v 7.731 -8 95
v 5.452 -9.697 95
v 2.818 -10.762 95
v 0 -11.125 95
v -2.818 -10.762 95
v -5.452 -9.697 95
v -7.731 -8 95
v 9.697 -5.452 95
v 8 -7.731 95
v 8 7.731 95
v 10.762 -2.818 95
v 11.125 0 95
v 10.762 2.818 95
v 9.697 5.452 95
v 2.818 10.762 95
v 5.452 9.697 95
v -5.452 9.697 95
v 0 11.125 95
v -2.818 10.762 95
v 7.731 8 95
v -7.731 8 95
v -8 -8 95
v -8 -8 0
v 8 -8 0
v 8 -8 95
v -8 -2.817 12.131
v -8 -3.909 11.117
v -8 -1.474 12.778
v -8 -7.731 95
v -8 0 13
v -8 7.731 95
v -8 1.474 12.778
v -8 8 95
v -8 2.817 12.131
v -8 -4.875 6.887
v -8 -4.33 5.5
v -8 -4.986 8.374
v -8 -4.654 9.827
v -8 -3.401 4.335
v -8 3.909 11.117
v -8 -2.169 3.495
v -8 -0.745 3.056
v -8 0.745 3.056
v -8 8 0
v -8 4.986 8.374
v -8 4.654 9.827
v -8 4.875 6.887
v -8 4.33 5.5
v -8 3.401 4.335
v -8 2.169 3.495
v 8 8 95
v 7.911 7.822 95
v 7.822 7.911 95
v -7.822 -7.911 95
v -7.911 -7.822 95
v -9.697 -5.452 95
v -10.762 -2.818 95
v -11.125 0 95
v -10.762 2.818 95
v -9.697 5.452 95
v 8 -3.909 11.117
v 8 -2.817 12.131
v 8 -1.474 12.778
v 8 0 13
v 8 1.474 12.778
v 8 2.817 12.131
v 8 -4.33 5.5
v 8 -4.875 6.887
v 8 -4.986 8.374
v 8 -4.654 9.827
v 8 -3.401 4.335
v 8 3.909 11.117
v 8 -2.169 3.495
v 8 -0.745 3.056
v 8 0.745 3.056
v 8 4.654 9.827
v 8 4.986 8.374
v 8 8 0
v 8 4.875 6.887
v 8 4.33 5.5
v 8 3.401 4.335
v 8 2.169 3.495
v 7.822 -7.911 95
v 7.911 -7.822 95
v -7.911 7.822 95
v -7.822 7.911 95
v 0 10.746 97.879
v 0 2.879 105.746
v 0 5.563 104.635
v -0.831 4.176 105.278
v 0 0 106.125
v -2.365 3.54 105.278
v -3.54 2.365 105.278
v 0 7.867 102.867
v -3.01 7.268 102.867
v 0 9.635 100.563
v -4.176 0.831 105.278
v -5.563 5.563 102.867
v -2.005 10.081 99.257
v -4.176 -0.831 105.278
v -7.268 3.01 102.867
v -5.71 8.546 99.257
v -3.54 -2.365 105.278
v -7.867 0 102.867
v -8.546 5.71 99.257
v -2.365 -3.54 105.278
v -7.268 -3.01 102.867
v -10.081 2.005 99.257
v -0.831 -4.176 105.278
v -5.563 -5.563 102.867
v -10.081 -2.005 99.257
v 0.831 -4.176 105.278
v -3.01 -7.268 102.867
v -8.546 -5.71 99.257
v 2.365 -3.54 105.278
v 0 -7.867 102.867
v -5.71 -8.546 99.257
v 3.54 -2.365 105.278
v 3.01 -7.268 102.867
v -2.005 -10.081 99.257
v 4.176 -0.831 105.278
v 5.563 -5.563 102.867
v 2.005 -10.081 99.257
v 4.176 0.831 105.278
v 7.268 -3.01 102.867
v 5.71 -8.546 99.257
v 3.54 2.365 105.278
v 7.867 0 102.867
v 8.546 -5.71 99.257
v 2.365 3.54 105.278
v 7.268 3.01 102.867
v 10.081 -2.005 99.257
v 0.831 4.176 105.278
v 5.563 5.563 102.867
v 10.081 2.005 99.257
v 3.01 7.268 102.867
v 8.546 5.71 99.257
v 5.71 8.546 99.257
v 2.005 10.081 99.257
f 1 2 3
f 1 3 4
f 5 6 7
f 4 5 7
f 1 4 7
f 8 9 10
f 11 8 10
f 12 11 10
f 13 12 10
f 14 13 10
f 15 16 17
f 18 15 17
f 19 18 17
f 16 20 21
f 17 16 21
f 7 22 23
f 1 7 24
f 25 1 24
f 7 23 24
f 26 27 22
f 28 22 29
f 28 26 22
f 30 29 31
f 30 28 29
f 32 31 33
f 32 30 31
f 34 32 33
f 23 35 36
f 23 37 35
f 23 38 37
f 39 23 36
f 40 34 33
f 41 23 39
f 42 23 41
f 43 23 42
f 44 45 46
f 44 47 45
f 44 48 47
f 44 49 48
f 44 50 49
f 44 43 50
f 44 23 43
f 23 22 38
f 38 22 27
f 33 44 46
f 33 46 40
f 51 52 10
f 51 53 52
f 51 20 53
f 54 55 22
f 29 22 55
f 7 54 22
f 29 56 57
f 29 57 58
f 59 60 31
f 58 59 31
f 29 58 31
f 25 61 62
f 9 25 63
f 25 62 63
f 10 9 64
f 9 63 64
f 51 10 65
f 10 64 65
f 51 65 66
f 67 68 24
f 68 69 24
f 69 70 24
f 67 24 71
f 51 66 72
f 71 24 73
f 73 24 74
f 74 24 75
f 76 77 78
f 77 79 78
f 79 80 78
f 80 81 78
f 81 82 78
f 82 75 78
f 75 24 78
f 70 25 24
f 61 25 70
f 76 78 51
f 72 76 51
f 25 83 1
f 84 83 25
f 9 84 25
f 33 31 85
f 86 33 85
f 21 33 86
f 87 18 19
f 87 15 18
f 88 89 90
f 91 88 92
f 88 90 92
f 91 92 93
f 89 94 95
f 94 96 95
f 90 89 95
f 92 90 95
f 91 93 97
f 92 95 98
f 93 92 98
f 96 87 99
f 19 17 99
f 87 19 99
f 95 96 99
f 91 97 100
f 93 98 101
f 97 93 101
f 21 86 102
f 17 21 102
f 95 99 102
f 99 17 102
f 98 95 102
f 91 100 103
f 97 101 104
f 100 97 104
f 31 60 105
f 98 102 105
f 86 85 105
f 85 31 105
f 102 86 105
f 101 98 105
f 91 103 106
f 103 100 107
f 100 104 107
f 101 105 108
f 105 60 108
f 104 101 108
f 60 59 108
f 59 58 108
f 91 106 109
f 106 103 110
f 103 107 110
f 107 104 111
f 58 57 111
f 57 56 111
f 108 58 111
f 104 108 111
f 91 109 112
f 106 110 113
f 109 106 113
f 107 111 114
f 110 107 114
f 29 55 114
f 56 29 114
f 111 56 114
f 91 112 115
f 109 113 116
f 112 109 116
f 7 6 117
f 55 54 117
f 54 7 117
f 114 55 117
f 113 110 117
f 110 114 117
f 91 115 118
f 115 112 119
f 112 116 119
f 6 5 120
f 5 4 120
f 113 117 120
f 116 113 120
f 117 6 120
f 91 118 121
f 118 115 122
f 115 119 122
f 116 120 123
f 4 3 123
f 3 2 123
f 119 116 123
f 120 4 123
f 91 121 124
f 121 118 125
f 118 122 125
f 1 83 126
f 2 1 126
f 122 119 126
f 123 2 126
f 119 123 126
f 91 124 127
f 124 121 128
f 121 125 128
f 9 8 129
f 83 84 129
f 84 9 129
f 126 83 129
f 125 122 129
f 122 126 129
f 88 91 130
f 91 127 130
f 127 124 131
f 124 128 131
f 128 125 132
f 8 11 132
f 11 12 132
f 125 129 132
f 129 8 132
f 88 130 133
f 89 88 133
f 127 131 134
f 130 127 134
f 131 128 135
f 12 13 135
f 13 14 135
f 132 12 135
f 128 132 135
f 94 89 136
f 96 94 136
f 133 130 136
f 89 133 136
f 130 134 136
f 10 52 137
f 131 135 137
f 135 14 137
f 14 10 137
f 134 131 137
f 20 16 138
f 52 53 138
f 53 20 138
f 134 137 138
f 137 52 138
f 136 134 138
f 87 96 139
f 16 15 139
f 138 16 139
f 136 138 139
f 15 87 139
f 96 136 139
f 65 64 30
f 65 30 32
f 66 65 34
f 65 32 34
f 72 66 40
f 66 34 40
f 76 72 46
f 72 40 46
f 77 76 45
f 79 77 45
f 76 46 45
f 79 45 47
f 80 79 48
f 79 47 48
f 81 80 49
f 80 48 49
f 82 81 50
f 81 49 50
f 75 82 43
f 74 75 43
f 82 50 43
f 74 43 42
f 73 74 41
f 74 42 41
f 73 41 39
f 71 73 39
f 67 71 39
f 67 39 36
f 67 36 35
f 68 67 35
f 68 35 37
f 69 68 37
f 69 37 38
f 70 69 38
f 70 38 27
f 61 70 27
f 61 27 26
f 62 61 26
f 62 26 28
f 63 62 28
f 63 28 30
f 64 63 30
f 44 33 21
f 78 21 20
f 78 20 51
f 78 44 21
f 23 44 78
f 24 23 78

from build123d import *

# Parameters (mm, degrees)
SKETCH1_W           = 16
SKETCH1_H           = 16
BOSS_EXTRUDE1_DEPTH = 95
SKETCH2_R           = 5
CUT_EXTRUDE1_DEPTH  = 75


with BuildPart() as part:
    # Sketch1 → Boss-Extrude1 (new body)
    with BuildSketch(Plane.XY):
        Rectangle(SKETCH1_W, SKETCH1_H)
    extrude(amount=BOSS_EXTRUDE1_DEPTH)

    # Sketch2 → Cut-Extrude1 (cut)
    with BuildSketch(Plane.ZY.offset(8)):
        with Locations((8, 0)):
            Circle(SKETCH2_R)
    extrude(amount=-CUT_EXTRUDE1_DEPTH, mode=Mode.SUBTRACT)

    # Sketch3 → Revolve1 (revolve)
    with BuildSketch(Plane(origin=(0, 0, 0), x_dir=(0, 0, -1), z_dir=(1, 0, 0))):
        with BuildLine():
            Line((-95, 11.12523004), (-95, 0))
            Line((-95, 0), (-106.12523004, 0))
            ThreePointArc((-106.12523004, 0), (-102.866725603, 7.866725603), (-95, 11.12523004))
        make_face()
    revolve(axis=Axis((0, 0, 95), (0, 0, 1)))


solid = part.part
